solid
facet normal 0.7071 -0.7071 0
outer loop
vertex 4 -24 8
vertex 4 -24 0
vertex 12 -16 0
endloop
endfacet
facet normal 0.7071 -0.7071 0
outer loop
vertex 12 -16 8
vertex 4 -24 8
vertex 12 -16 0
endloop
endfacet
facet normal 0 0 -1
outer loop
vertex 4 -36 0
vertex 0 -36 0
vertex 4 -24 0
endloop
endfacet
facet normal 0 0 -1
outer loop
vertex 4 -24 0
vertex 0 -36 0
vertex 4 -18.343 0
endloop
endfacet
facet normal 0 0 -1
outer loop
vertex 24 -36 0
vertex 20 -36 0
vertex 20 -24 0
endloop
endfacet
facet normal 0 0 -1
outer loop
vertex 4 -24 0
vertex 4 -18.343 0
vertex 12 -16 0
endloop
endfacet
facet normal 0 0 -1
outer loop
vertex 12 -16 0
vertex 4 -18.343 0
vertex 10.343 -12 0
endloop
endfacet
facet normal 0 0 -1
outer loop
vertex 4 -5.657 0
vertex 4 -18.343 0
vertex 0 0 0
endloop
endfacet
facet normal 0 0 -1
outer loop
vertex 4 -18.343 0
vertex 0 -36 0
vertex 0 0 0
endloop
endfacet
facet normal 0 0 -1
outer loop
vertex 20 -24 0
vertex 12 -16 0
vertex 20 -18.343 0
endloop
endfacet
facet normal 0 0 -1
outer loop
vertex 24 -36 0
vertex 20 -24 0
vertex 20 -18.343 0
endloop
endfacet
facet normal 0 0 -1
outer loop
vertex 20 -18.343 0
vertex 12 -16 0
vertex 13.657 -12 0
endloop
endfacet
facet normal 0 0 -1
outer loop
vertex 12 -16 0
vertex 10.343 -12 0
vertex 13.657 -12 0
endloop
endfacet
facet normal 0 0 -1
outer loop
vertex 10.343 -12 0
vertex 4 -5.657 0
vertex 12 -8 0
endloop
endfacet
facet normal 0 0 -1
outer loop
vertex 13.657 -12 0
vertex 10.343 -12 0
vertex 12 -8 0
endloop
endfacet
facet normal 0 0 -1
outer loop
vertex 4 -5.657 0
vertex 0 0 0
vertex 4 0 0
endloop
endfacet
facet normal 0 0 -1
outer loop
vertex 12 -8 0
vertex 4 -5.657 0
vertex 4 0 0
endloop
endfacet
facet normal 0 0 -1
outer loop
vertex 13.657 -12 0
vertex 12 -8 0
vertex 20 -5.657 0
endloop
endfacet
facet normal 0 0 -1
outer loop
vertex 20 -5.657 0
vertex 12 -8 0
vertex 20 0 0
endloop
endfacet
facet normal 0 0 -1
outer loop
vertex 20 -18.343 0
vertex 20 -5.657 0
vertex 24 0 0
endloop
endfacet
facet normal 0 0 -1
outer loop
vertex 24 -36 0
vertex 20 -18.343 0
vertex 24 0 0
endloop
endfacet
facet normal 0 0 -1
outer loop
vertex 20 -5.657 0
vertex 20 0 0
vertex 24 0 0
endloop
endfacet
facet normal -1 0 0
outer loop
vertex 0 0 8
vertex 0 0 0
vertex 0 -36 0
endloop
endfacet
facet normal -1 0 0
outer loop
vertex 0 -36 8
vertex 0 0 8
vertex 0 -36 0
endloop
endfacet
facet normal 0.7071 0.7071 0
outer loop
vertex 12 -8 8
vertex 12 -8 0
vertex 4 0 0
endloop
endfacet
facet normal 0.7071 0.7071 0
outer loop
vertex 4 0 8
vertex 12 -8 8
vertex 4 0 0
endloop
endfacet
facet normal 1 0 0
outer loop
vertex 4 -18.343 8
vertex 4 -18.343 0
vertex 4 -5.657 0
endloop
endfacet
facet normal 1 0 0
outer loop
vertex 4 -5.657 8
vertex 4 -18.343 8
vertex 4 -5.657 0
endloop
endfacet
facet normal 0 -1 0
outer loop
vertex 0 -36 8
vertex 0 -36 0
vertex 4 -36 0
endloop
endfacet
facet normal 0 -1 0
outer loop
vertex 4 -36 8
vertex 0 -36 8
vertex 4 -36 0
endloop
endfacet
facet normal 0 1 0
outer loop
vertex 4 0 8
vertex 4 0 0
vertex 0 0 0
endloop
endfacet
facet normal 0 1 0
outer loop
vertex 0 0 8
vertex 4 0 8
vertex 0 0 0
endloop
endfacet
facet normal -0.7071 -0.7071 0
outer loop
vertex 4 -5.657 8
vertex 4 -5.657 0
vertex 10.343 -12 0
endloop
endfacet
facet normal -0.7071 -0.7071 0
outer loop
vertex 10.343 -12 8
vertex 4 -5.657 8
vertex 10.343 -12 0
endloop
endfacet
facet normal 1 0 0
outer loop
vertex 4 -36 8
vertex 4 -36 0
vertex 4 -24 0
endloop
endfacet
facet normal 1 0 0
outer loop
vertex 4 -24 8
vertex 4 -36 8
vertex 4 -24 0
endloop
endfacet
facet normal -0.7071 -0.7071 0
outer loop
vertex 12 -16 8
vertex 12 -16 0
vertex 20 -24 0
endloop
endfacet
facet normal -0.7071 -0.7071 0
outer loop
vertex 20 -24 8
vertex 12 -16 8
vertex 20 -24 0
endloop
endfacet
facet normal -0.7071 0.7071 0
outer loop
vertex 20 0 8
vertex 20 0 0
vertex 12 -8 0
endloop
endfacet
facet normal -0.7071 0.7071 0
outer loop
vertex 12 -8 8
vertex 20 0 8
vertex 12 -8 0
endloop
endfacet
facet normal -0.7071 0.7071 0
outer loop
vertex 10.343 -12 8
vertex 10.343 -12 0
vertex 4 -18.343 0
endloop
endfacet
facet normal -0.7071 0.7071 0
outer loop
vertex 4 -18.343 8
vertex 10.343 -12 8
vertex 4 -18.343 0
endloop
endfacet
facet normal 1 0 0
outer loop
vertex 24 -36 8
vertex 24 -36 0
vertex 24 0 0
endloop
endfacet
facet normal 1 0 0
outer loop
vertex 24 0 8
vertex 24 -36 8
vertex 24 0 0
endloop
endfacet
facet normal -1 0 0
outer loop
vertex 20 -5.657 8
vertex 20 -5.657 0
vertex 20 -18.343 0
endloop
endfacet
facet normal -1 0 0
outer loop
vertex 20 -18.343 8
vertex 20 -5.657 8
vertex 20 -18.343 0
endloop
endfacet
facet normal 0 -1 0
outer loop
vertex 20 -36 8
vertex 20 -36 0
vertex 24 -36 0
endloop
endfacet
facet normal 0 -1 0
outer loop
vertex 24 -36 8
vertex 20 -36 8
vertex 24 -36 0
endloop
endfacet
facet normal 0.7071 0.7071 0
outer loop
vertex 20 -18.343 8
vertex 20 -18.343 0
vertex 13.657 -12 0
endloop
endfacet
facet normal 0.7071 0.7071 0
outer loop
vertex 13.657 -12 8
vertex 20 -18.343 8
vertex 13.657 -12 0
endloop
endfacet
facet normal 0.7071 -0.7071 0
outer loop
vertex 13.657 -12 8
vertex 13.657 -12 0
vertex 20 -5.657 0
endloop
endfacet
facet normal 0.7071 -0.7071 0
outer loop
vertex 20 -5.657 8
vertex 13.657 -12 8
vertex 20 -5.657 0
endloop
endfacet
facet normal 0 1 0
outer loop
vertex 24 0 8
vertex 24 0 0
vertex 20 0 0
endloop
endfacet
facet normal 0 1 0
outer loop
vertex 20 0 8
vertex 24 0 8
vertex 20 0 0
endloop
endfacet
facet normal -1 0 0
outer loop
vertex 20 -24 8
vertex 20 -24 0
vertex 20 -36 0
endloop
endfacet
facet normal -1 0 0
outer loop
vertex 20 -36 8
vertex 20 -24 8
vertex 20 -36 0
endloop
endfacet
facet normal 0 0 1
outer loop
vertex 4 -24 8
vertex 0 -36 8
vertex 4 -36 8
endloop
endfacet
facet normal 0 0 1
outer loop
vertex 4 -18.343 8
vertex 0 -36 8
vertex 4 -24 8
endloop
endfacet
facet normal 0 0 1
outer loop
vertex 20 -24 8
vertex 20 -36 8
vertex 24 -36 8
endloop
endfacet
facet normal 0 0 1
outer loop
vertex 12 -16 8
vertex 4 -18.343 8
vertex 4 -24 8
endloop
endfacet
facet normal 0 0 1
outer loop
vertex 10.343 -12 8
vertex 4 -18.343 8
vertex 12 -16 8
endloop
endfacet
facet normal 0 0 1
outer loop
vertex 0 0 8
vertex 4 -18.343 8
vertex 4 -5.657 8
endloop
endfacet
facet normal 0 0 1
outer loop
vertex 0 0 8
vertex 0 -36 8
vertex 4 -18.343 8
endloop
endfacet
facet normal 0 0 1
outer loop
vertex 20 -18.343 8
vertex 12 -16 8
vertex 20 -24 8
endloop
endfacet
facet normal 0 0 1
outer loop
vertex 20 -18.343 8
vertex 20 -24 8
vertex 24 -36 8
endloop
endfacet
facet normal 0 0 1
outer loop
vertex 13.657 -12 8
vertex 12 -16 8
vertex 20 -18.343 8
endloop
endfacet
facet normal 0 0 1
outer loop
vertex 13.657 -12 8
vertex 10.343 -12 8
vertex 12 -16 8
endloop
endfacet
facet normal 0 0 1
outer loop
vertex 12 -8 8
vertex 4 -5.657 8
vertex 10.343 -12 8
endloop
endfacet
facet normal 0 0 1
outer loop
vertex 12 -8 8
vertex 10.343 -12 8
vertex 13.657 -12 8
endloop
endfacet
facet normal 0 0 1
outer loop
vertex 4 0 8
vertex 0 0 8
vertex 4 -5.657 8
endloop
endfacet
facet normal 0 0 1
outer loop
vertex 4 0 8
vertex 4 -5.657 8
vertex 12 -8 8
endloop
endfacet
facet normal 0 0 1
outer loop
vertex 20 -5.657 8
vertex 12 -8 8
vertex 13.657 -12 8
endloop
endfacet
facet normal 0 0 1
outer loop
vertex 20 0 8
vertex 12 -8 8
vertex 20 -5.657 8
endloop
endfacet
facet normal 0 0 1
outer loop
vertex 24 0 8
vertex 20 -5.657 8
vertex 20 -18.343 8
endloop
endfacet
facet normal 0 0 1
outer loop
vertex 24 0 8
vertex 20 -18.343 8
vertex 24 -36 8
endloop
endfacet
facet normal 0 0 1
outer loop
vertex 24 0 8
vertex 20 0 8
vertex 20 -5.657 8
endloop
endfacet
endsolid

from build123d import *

# Parameters (mm, degrees)
F1_DEPTH = 8


with BuildPart() as f1:
    # F0 (on Top) → F1 (new body)
    with BuildSketch(Plane.XY):
        Polygon((4, -36), (4, -24), (12, -16), (20, -24), (20, -36), (24, -36), (24, 0), (20, 0), (12, -8), (4, 0), (0, 0), (0, -36), align=None)
        Polygon((10.343146, -12), (4, -18.343146), (4, -5.656854), align=None, mode=Mode.SUBTRACT)
        Polygon((20, -18.343146), (13.656854, -12), (20, -5.656854), align=None, mode=Mode.SUBTRACT)
    extrude(amount=F1_DEPTH)


solid = f1.part
